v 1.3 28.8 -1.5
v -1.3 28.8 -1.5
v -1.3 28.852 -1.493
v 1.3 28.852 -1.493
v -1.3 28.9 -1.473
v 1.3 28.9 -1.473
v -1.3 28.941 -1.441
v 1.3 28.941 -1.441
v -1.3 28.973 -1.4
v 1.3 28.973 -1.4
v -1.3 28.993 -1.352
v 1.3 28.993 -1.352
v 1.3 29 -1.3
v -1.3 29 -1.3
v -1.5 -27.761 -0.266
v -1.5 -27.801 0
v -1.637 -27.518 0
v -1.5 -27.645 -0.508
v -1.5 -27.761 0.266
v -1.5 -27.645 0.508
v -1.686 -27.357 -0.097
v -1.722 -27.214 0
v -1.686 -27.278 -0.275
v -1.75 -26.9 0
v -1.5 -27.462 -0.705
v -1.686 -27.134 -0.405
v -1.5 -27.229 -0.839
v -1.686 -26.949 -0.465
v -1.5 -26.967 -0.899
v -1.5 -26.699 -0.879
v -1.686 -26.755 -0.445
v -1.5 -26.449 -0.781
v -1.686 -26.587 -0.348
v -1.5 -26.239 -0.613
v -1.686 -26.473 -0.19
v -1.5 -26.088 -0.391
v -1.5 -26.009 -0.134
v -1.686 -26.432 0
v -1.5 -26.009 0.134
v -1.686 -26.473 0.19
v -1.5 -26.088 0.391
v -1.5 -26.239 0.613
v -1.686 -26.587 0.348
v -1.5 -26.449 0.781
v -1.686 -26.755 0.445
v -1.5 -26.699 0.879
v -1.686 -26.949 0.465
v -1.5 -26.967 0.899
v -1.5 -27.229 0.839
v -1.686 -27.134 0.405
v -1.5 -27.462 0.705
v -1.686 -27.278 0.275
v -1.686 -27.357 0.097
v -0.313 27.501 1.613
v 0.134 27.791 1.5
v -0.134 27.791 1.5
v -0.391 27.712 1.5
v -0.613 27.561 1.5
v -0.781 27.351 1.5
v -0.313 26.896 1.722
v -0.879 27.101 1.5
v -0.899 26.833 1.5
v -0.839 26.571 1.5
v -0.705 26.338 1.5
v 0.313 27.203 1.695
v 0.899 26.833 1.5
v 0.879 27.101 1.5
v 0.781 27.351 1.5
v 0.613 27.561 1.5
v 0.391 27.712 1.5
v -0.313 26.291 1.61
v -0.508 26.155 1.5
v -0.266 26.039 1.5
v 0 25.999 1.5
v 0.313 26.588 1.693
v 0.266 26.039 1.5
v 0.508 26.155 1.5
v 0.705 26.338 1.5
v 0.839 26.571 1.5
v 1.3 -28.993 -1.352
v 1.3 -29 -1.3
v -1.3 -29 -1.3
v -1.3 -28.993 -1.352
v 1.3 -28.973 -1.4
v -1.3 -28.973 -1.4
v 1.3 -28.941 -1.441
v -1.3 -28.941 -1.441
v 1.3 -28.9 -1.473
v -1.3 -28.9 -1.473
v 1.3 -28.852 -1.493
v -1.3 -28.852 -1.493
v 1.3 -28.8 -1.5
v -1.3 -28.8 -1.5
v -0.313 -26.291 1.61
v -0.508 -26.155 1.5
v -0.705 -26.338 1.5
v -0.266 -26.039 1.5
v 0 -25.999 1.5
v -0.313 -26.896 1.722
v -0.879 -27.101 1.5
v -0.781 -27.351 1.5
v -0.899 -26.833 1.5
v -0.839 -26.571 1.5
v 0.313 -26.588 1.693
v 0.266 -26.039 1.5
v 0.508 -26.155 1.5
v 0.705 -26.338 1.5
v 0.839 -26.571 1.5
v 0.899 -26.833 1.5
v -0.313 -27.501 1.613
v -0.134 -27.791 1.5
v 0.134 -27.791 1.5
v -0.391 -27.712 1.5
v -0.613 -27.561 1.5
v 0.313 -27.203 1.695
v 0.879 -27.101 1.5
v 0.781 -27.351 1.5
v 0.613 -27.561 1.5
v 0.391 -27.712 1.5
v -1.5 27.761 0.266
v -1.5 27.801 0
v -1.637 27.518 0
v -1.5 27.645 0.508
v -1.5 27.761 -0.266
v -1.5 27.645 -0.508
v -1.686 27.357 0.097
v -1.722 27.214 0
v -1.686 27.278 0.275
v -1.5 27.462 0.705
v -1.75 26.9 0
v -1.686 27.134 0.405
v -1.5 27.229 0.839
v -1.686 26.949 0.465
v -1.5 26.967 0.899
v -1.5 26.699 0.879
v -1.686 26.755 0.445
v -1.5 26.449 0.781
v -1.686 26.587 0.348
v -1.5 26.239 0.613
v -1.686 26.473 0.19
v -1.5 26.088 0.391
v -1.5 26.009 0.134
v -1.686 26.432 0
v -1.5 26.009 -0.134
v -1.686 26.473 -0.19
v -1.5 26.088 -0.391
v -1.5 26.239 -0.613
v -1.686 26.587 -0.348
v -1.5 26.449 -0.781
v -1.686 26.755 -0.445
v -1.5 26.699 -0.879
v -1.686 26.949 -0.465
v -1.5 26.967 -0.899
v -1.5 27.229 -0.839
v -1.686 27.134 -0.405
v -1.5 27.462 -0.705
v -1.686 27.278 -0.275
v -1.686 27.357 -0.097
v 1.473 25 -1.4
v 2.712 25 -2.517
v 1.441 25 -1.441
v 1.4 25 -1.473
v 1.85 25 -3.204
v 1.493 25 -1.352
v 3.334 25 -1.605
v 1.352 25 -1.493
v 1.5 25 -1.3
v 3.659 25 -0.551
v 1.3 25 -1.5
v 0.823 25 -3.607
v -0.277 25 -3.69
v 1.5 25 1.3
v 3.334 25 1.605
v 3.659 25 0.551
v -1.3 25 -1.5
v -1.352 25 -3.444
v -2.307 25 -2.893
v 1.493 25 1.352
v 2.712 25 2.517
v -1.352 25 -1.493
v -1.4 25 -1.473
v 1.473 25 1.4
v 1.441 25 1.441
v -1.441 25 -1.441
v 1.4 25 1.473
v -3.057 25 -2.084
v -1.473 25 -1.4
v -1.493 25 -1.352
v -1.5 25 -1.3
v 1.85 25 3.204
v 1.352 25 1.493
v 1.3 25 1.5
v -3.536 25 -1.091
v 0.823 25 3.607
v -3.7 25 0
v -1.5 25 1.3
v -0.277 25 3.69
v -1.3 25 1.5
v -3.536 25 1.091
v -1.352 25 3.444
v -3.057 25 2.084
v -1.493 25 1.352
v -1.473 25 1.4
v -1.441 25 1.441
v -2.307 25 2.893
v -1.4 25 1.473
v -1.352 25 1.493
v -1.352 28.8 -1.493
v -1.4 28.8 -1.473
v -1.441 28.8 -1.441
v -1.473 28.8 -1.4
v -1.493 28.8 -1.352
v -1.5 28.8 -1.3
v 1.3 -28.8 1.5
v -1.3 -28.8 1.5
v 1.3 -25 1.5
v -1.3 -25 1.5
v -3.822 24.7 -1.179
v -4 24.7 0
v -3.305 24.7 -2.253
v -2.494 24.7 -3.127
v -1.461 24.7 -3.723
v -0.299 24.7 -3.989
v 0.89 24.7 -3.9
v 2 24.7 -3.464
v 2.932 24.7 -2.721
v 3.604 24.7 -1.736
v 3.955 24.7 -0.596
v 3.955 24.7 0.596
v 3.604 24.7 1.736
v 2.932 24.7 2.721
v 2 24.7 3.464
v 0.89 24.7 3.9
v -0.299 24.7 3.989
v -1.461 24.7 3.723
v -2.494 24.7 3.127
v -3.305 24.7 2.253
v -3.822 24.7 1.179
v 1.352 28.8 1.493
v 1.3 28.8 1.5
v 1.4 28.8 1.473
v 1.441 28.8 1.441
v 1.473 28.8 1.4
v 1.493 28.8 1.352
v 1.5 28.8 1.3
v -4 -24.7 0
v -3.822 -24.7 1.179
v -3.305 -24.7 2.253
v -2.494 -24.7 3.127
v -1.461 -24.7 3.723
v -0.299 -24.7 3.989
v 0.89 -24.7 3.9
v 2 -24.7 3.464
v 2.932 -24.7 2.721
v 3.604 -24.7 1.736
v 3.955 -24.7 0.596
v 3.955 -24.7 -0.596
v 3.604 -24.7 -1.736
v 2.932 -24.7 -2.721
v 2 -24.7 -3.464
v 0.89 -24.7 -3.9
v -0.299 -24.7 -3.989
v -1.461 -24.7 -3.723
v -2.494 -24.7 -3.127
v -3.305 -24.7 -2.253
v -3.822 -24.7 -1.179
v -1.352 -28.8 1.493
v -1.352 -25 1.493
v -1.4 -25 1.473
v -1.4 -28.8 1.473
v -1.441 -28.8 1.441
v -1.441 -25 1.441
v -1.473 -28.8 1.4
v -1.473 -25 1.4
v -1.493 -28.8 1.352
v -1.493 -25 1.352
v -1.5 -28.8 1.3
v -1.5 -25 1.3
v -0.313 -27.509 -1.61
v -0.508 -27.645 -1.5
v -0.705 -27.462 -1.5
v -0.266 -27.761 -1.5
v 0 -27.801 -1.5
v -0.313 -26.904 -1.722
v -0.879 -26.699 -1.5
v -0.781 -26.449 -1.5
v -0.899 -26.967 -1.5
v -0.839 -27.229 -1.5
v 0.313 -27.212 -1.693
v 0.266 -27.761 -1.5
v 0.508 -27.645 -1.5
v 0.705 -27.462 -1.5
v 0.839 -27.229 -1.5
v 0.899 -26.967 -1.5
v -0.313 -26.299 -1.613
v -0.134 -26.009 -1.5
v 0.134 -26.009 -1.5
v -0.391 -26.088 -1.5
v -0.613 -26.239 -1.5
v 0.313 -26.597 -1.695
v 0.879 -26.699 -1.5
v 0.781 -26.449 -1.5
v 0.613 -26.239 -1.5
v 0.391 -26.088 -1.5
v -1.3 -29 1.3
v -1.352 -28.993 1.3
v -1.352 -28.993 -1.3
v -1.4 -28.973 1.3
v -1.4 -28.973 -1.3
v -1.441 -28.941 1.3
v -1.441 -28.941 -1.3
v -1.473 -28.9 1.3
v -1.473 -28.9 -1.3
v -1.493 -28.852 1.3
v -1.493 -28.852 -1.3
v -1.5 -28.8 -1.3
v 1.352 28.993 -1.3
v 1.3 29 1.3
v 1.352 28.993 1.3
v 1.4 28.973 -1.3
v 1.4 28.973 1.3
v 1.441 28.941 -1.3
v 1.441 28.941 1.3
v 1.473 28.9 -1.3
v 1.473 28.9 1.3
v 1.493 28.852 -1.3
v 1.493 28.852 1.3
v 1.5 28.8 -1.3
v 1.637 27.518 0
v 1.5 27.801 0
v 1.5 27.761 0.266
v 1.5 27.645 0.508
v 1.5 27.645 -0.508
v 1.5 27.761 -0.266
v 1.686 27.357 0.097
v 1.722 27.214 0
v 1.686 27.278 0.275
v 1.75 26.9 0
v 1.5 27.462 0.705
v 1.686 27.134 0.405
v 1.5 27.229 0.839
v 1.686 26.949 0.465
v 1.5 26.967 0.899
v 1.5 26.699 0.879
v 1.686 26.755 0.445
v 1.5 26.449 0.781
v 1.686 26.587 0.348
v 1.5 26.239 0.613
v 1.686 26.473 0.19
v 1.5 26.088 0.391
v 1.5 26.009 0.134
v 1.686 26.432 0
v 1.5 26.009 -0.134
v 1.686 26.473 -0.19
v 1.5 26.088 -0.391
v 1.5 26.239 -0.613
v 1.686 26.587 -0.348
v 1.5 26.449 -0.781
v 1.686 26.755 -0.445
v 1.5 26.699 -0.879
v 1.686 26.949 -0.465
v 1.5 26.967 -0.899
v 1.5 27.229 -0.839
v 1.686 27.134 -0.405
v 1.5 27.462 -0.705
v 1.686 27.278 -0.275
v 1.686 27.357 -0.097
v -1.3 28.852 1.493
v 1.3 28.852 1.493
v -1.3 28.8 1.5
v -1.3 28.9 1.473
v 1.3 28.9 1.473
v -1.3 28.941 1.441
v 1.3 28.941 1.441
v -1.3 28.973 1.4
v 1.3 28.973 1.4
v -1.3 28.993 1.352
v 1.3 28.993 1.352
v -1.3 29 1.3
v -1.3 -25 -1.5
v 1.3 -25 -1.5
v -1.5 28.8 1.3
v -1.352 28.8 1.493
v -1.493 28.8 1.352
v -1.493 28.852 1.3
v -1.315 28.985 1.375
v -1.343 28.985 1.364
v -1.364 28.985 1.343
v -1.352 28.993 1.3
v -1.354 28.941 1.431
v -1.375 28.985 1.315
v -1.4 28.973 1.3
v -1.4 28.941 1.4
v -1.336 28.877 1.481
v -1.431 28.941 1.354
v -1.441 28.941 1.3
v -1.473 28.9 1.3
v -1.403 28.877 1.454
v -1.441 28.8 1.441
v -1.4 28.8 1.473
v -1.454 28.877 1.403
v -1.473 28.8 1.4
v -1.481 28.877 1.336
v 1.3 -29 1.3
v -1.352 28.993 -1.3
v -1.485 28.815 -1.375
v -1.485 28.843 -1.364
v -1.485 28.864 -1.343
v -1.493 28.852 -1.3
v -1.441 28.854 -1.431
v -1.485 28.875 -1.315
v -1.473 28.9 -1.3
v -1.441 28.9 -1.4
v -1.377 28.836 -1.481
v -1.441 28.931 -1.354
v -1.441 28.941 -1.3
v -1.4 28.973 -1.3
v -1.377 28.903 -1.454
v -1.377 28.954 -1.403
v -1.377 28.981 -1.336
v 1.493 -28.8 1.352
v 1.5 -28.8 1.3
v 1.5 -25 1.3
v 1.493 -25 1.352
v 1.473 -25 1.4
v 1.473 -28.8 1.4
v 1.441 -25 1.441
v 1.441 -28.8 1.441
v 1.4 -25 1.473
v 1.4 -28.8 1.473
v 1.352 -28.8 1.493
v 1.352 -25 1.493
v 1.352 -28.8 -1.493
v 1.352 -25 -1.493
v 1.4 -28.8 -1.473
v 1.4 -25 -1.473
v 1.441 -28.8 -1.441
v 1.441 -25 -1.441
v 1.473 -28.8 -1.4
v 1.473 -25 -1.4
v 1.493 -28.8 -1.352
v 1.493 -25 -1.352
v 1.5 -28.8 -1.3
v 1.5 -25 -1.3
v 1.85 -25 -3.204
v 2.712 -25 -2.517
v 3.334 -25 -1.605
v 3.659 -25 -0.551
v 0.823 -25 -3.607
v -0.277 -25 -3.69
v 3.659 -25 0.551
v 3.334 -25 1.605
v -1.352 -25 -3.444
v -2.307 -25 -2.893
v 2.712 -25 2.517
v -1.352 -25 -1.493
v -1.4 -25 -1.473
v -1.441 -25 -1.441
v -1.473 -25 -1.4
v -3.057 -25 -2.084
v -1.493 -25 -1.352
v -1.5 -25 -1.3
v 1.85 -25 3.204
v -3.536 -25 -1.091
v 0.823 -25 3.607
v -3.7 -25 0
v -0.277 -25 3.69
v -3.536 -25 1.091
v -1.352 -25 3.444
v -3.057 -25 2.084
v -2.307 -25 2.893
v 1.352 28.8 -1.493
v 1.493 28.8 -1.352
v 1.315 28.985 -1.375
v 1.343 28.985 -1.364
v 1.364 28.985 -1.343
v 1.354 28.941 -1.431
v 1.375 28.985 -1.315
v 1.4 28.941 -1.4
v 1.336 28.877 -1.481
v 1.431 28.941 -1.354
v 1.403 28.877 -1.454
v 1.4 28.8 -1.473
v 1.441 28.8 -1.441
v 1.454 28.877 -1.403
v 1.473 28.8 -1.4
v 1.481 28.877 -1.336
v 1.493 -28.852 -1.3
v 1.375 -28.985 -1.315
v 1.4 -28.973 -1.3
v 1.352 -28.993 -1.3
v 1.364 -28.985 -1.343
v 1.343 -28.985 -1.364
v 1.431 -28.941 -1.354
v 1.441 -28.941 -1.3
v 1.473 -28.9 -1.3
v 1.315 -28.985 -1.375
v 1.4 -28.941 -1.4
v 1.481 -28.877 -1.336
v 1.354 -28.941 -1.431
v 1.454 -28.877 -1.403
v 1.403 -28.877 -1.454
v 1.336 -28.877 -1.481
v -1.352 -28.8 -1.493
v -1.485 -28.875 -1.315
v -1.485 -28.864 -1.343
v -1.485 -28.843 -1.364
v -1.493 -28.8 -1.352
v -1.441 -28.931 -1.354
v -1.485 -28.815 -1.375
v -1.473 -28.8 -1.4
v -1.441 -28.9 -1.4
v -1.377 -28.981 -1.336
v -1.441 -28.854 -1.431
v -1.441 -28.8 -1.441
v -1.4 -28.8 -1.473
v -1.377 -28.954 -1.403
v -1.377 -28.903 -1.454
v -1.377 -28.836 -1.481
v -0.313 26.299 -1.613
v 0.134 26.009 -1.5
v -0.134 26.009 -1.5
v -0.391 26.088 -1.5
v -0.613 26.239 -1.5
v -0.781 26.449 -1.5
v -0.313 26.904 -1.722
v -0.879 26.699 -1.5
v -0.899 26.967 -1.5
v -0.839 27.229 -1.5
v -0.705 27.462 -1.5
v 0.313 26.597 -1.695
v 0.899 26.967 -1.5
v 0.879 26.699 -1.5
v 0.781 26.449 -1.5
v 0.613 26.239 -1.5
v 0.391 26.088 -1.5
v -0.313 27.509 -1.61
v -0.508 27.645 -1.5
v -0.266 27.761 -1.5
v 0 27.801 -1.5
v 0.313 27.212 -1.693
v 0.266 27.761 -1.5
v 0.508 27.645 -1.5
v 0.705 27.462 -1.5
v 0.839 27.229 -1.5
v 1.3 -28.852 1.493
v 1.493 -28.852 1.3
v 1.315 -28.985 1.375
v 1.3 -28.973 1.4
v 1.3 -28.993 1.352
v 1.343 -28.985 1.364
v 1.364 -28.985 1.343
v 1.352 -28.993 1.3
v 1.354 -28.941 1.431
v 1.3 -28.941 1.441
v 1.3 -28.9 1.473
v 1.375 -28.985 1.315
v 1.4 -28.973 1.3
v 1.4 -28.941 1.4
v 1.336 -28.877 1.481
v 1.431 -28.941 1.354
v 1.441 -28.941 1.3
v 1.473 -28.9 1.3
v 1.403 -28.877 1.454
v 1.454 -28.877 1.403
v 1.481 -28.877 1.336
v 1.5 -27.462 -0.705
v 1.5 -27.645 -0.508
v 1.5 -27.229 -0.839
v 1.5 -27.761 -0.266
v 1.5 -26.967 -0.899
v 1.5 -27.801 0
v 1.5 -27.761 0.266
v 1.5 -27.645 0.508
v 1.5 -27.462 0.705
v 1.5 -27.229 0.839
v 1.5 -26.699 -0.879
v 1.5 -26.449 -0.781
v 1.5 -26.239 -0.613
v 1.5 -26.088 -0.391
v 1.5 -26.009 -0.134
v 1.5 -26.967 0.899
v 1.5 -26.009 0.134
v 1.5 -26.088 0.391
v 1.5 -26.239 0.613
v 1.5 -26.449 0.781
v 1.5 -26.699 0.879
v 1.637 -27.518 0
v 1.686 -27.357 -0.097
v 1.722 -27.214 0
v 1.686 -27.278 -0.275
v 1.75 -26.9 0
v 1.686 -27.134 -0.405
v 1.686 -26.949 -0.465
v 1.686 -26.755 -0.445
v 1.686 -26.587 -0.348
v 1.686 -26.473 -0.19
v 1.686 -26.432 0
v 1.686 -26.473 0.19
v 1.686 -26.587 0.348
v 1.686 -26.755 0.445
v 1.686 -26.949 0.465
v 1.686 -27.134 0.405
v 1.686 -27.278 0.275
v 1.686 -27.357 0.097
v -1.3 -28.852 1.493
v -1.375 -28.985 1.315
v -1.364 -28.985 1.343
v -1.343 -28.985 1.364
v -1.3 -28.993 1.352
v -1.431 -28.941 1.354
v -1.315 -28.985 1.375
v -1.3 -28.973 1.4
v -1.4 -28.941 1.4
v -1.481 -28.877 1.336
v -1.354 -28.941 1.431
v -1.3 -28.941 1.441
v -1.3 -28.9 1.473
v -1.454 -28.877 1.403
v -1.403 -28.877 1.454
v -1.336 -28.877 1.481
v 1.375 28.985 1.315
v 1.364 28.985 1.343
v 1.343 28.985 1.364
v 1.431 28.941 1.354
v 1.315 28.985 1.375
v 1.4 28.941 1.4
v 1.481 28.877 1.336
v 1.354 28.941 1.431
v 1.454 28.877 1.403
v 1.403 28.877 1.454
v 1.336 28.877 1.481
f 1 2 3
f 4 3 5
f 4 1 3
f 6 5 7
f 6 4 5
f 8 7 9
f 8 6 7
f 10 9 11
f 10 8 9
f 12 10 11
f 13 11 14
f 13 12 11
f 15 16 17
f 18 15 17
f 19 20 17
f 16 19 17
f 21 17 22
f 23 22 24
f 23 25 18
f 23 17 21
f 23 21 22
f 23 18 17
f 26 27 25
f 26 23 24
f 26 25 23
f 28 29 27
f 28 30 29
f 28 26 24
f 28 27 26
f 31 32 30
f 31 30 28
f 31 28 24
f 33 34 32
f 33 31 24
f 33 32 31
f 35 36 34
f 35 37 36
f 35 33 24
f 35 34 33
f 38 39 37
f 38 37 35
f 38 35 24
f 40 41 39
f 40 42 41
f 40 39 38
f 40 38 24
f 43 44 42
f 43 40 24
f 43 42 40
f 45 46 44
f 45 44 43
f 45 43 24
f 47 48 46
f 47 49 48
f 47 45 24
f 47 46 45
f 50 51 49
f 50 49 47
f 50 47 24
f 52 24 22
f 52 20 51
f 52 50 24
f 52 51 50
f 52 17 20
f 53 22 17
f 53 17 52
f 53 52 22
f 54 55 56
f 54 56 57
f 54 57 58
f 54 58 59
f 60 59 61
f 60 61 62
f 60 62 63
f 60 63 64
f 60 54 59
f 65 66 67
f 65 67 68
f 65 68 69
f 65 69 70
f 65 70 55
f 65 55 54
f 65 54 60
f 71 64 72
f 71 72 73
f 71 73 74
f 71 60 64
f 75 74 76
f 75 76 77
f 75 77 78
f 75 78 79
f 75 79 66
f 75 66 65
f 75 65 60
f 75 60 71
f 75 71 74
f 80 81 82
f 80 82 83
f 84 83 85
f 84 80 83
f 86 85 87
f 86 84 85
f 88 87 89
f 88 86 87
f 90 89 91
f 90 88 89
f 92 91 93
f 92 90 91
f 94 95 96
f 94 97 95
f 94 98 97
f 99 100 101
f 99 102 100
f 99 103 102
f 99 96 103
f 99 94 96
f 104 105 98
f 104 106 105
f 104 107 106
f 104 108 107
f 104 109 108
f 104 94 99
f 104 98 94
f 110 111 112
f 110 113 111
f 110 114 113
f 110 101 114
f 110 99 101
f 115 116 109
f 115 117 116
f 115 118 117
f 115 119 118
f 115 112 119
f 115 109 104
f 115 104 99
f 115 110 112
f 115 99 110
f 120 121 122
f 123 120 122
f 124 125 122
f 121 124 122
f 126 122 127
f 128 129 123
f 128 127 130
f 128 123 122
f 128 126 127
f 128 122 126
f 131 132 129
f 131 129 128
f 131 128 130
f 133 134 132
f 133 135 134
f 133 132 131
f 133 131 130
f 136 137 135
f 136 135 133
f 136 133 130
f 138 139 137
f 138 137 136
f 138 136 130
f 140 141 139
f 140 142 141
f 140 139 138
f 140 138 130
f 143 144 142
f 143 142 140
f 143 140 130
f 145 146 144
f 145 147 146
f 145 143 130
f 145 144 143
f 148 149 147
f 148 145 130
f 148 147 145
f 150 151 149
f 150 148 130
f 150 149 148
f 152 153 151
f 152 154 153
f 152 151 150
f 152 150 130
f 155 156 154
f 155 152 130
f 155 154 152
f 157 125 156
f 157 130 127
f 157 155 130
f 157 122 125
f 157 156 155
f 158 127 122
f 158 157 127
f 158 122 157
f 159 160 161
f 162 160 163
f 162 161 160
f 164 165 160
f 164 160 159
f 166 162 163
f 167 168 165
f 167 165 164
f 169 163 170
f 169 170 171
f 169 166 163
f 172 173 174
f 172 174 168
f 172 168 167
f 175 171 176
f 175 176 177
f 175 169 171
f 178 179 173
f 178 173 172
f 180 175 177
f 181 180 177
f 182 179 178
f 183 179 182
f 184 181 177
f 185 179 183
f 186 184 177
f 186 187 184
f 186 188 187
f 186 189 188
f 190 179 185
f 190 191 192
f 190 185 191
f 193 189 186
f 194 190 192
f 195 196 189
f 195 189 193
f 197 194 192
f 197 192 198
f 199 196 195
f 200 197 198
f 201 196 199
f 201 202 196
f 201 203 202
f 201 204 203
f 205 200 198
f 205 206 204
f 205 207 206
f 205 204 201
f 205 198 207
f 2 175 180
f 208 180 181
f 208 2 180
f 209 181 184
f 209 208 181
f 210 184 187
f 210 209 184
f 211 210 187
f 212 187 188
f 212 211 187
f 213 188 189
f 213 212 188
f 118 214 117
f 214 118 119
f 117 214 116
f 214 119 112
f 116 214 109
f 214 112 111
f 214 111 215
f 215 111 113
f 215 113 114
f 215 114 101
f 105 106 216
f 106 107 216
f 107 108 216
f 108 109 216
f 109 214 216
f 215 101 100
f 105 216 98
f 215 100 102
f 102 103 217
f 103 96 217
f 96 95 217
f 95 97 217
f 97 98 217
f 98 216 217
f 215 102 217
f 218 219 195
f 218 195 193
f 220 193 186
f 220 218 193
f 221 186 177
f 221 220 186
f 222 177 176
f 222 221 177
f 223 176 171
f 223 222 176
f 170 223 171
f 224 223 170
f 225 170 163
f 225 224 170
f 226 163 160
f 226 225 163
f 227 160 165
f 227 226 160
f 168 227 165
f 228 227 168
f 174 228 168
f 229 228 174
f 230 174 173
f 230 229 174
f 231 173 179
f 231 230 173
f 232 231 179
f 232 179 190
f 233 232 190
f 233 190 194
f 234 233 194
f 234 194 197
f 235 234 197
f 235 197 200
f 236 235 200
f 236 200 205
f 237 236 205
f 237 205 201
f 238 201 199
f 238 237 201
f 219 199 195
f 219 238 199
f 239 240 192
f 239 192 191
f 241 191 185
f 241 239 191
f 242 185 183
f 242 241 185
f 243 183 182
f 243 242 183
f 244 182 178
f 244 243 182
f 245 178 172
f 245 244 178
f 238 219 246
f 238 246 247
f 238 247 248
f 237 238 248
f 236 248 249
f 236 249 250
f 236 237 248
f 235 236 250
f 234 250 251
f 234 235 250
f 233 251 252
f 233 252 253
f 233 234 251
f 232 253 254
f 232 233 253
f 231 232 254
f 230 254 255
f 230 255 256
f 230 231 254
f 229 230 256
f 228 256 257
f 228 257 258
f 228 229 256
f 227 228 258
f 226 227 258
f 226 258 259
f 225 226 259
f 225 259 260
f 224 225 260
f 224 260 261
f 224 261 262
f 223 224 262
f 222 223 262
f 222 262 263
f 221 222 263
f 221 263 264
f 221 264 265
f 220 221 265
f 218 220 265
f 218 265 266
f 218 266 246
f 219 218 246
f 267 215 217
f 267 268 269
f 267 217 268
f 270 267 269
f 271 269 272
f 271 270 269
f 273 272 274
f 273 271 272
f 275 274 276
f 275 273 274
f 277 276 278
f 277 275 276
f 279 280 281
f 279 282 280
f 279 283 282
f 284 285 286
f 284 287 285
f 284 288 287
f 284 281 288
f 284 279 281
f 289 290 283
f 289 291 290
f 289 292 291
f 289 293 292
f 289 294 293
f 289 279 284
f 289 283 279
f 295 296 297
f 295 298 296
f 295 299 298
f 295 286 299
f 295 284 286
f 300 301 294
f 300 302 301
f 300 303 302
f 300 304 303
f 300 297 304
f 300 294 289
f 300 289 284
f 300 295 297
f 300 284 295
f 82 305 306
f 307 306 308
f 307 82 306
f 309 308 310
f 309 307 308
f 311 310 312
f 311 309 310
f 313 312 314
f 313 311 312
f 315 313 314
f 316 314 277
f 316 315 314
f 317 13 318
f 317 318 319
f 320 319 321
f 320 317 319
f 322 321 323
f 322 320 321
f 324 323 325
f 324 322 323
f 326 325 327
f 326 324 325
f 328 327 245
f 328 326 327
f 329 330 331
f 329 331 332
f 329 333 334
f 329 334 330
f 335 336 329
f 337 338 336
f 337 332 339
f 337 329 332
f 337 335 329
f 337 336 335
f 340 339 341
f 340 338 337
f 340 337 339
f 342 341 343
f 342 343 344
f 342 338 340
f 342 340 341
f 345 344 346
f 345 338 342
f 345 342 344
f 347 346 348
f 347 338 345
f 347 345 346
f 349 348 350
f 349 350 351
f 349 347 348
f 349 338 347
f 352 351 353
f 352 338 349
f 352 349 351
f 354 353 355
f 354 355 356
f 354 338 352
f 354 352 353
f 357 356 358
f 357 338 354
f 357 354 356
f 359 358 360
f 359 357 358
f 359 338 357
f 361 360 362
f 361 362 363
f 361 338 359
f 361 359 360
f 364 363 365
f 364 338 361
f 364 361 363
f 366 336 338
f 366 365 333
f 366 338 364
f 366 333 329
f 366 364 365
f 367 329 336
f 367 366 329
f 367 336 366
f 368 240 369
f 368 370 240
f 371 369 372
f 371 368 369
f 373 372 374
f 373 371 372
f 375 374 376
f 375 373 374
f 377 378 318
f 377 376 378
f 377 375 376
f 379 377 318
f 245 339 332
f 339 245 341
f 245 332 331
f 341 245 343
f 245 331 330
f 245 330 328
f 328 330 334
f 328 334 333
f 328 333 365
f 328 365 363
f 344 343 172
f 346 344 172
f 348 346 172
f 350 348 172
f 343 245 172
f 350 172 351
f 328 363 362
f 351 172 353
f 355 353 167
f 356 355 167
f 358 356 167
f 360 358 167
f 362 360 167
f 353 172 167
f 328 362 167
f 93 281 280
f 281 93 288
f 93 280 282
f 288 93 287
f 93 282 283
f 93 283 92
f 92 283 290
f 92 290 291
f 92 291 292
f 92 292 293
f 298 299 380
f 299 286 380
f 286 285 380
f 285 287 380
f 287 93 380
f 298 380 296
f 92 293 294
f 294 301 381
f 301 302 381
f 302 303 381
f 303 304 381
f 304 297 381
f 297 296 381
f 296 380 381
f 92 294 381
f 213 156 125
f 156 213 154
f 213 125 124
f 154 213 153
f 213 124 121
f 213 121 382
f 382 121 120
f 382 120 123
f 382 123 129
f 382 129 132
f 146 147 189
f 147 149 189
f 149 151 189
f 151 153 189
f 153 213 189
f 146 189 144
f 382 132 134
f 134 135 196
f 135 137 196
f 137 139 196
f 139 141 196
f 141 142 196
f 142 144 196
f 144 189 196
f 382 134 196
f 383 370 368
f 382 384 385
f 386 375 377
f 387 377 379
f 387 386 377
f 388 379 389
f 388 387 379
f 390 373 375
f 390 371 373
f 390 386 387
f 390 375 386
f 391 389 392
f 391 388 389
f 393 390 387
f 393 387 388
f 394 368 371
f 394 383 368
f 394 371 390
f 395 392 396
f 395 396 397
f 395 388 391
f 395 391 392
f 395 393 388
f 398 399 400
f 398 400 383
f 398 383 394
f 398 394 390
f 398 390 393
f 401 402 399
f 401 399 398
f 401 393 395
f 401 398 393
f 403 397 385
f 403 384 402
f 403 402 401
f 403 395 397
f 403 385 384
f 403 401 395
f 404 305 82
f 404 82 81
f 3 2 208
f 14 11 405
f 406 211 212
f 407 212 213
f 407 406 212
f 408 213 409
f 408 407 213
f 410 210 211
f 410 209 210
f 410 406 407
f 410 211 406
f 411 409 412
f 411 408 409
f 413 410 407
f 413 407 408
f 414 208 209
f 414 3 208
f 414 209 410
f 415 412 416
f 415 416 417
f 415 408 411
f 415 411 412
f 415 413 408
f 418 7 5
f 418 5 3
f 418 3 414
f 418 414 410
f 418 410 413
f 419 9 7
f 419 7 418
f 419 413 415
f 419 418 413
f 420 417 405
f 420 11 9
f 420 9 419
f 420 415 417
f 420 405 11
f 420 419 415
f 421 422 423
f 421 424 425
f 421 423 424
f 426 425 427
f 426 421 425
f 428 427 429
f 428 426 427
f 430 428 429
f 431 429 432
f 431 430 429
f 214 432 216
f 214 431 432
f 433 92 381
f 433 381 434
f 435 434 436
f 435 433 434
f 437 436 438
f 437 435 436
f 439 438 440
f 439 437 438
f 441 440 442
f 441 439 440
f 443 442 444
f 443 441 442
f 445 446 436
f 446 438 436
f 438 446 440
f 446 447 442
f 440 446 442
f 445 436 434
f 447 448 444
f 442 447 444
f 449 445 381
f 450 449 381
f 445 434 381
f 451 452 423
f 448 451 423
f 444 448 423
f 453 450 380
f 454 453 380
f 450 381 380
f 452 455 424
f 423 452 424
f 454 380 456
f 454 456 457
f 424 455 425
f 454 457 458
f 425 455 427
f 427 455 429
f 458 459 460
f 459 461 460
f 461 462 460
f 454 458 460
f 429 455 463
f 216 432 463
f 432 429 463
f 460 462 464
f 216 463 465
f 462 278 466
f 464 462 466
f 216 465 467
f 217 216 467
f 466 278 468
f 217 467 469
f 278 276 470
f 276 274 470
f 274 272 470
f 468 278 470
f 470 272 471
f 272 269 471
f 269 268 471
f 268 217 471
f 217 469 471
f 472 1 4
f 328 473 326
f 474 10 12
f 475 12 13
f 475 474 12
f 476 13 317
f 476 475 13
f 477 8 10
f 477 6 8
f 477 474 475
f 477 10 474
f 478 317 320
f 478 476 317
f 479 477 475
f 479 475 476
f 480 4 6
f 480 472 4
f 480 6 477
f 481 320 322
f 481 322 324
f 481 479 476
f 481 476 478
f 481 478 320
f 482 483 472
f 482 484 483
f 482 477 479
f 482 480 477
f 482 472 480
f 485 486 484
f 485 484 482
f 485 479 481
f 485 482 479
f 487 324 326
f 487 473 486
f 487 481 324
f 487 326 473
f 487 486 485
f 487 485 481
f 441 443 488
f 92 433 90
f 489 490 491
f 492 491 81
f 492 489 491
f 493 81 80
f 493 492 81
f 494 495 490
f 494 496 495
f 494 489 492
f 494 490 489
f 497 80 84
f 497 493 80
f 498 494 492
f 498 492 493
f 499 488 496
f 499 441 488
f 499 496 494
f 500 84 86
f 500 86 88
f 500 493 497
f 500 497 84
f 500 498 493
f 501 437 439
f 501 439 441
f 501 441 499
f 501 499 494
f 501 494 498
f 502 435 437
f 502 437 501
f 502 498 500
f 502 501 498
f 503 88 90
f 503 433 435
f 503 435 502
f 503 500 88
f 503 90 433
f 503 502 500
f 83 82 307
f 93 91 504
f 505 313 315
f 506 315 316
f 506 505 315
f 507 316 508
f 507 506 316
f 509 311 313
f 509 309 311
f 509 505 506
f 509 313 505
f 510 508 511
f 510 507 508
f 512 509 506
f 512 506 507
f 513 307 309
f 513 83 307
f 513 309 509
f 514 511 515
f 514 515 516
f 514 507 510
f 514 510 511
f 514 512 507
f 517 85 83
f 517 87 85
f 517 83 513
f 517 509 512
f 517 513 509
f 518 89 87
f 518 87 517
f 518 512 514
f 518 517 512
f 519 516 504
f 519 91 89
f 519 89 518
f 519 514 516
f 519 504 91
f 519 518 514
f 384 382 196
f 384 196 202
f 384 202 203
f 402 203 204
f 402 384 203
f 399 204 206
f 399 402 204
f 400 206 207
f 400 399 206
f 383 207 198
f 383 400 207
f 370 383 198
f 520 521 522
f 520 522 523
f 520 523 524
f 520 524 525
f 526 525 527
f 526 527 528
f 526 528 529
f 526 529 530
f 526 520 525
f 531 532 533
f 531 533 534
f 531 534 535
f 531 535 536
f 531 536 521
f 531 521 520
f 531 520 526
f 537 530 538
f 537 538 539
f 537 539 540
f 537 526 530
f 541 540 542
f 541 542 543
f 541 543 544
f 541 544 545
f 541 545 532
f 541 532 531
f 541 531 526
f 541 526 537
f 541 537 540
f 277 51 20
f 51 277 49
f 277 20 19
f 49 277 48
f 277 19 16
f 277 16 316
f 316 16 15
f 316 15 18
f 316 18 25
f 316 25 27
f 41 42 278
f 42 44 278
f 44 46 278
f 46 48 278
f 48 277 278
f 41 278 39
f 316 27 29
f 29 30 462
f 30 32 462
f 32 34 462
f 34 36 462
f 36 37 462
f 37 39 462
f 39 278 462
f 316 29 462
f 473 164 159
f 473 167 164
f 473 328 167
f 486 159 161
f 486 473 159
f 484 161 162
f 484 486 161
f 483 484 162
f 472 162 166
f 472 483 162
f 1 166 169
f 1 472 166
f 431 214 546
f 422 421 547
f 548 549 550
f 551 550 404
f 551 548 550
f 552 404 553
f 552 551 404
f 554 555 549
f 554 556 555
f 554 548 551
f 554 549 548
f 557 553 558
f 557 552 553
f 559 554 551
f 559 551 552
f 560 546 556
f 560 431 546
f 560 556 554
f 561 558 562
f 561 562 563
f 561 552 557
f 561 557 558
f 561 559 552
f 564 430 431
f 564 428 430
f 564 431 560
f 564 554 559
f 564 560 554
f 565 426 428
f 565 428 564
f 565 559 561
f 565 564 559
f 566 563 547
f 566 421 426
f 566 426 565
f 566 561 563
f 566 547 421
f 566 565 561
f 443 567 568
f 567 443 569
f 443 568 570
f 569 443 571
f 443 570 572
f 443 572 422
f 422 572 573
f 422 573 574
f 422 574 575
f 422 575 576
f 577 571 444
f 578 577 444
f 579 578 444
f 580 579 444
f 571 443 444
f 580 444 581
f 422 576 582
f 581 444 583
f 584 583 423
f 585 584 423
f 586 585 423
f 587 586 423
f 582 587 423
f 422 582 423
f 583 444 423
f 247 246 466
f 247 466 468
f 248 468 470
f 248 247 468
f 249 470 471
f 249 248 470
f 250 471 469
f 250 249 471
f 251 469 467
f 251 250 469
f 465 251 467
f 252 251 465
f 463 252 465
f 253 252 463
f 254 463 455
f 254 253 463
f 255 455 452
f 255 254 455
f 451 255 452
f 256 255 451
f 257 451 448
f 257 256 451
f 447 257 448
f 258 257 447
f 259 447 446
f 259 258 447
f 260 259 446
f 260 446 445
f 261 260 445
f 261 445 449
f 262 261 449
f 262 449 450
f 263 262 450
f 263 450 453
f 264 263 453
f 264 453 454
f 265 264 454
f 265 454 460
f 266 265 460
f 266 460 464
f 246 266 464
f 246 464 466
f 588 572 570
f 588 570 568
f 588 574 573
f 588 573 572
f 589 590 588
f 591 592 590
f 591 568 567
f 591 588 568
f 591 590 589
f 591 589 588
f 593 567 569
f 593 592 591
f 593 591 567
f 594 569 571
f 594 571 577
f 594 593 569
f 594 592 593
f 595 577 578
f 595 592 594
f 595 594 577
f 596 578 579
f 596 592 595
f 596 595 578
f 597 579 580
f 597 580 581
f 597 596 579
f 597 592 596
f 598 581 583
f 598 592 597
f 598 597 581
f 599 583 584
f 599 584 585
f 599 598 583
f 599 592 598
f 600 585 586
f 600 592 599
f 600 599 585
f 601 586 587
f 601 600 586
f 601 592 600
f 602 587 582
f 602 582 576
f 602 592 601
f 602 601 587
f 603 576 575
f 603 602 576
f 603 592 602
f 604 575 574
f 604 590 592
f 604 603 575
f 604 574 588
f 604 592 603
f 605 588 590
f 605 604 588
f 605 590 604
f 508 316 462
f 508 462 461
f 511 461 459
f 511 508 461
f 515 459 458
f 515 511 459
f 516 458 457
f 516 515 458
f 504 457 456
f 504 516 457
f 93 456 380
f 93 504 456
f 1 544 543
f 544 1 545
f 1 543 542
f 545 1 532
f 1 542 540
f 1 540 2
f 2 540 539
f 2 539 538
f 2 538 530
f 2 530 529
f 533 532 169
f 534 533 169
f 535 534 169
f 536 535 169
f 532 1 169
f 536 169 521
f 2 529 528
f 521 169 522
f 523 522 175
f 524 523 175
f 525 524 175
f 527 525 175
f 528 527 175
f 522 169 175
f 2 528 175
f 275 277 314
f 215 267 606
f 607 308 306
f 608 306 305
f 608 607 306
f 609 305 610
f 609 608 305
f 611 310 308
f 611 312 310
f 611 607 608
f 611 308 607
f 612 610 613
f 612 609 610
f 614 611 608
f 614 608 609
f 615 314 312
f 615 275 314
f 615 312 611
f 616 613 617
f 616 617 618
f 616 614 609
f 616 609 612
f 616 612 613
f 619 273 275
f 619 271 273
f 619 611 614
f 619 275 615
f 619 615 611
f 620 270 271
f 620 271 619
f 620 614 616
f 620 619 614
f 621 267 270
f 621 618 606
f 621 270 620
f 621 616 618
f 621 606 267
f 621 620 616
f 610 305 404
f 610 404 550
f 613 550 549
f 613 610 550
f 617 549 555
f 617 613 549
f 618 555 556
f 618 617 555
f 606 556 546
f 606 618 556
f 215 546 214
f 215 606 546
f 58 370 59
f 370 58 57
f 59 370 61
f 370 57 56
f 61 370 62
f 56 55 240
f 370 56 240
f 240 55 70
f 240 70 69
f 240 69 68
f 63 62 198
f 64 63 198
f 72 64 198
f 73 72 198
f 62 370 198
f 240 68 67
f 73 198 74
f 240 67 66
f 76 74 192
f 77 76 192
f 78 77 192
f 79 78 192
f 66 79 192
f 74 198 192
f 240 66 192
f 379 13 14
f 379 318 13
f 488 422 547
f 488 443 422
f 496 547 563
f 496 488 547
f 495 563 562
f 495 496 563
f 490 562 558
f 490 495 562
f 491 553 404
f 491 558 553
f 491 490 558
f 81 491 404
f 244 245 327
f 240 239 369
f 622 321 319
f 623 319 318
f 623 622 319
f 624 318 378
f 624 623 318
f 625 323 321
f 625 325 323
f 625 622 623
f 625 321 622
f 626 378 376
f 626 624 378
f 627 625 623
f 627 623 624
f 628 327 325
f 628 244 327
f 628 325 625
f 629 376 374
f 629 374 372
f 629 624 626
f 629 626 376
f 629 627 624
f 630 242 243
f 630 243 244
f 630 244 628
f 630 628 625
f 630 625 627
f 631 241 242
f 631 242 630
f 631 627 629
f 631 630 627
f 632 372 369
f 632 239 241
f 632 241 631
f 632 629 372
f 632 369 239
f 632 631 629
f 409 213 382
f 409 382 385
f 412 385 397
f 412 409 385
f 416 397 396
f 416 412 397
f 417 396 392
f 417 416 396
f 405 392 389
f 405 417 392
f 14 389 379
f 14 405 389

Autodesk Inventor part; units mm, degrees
ref_plane "YZ Plane" through (0, 0, 0) normal (1, 0, 0) x (0, 1, 0)
ref_plane "XZ Plane" through (0, 0, 0) normal (0, 1, 0) x (-1, 0, 0)
sketch "Sketch1" plane through (0, 0, 0) normal (0, 1, 0) x (-1, 0, 0)
  circle A0 centre (0, 0) radius 4
  dimension "d0" = 8
extrude "Extrusion1" add sketch "Sketch1" against normal mid plane 50
sketch "Sketch2" plane through (0, -25, 0) normal (0, -1, 0) x (1, 0, 0)
  circle A0 centre (0, 0) radius 4 projected
  line L0 (-5.6, 0) -> (5.6, 0) projected
  line L1 (-1.5, -1.5) -> (1.5, -1.5)
  line L2 (1.5, -1.5) -> (1.5, 1.5)
  line L3 (1.5, 1.5) -> (-1.5, 1.5)
  line L4 (-1.5, 1.5) -> (-1.5, -1.5)
  dimension "d3" = 3
  dimension "d4" = 3
  dimension "d5" = 1.5
  dimension "d6" = 1.5
extrude "Extrusion2" add sketch "Sketch2" along normal blind 4 contours L2 L1 L4 L0 | L0 L4 L3 L2
fillet "Fillet1" radius 0.2 8 edges at (1.5, -27, 1.5) (-1.5, -27, 1.5) (1.5, -27, -1.5) (0, -29, -1.5) (-1.5, -29, 0) (0, -29, 1.5) (1.5, -29, 0) (-1.5, -27, -1.5)
sketch "Sketch3" plane through (0, 0, 0) normal (0, 0, 1) x (1, 0, 0)
  line L0 (0, -4.8) -> (0, 0)
  line L1 (2.8, 0) -> (2.8, -4.8)
  arc A0 (-0.35, -2.4) -> (3.15, -2.4) centre (1.4, -2.4) ccw
  line L2 (0, -2.4) -> (2.8, -2.4) construction
  line L3 (-4, -25) -> (-4, 25) projected
  line L4 (-4, 25) -> (4, 25) projected
  line L5 (4, 25) -> (4, -25) projected
  line L6 (4, -25) -> (1.5, -25) projected
  line L7 (1.5, -25) -> (1.5, -28.8) projected
  arc A1 (1.3, -29) -> (1.5, -28.8) centre (1.3, -28.8) ccw projected
  line L8 (1.3, -29) -> (-1.3, -29) projected
  arc A2 (-1.5, -28.8) -> (-1.3, -29) centre (-1.3, -28.8) ccw projected
  line L9 (-1.5, -28.8) -> (-1.5, -25) projected
  line L10 (-1.5, -25) -> (-4, -25) projected
  line L11 (-1.5, -26.9) -> (1.5, -26.9) construction
  arc A3 (-1.75, -26.9) -> (1.75, -26.9) centre (0, -26.9) ccw
  line L12 (1.5, -26.9) -> (2.2631, -26.9) construction
  line L13 (-1.5, -26.9) -> (-1.9787, -26.9) construction
  line L14 (-1.75, -26.9) -> (1.75, -26.9)
  point P0 (1.4, -2.4)
  dimension "d10" = 1.75
  dimension "d11" = 3.5
revolve "Revolution1" add sketch "Sketch3" angle 360 about axis through (1.5, -26.9, 0) along (1, 0, 0) contours L14 L7 A3 L9 | L9 A3 L14 | L14 A3 L7
mirror "Mirror1" about plane through (0, 0, 0) normal (0, 1, 0) of "Extrusion2", "Revolution1", "Fillet1"
chamfer "Chamfer2" distance 0.3 angle 45 2 edges at (4, -25, 0) (4, 25, 0)
ref_plane "Work Plane1" through (0, 21.5, 0) normal (0, -1, 0) x (1, 0, 0)
split_face "Split1"
split_face "Split2"
equation "\"d3\" = d4"
equation "\"d5\" = 0.5 * d4"
equation "\"d6\" = 0.5 * d4"
properties part number "463-02" material "Steel"
